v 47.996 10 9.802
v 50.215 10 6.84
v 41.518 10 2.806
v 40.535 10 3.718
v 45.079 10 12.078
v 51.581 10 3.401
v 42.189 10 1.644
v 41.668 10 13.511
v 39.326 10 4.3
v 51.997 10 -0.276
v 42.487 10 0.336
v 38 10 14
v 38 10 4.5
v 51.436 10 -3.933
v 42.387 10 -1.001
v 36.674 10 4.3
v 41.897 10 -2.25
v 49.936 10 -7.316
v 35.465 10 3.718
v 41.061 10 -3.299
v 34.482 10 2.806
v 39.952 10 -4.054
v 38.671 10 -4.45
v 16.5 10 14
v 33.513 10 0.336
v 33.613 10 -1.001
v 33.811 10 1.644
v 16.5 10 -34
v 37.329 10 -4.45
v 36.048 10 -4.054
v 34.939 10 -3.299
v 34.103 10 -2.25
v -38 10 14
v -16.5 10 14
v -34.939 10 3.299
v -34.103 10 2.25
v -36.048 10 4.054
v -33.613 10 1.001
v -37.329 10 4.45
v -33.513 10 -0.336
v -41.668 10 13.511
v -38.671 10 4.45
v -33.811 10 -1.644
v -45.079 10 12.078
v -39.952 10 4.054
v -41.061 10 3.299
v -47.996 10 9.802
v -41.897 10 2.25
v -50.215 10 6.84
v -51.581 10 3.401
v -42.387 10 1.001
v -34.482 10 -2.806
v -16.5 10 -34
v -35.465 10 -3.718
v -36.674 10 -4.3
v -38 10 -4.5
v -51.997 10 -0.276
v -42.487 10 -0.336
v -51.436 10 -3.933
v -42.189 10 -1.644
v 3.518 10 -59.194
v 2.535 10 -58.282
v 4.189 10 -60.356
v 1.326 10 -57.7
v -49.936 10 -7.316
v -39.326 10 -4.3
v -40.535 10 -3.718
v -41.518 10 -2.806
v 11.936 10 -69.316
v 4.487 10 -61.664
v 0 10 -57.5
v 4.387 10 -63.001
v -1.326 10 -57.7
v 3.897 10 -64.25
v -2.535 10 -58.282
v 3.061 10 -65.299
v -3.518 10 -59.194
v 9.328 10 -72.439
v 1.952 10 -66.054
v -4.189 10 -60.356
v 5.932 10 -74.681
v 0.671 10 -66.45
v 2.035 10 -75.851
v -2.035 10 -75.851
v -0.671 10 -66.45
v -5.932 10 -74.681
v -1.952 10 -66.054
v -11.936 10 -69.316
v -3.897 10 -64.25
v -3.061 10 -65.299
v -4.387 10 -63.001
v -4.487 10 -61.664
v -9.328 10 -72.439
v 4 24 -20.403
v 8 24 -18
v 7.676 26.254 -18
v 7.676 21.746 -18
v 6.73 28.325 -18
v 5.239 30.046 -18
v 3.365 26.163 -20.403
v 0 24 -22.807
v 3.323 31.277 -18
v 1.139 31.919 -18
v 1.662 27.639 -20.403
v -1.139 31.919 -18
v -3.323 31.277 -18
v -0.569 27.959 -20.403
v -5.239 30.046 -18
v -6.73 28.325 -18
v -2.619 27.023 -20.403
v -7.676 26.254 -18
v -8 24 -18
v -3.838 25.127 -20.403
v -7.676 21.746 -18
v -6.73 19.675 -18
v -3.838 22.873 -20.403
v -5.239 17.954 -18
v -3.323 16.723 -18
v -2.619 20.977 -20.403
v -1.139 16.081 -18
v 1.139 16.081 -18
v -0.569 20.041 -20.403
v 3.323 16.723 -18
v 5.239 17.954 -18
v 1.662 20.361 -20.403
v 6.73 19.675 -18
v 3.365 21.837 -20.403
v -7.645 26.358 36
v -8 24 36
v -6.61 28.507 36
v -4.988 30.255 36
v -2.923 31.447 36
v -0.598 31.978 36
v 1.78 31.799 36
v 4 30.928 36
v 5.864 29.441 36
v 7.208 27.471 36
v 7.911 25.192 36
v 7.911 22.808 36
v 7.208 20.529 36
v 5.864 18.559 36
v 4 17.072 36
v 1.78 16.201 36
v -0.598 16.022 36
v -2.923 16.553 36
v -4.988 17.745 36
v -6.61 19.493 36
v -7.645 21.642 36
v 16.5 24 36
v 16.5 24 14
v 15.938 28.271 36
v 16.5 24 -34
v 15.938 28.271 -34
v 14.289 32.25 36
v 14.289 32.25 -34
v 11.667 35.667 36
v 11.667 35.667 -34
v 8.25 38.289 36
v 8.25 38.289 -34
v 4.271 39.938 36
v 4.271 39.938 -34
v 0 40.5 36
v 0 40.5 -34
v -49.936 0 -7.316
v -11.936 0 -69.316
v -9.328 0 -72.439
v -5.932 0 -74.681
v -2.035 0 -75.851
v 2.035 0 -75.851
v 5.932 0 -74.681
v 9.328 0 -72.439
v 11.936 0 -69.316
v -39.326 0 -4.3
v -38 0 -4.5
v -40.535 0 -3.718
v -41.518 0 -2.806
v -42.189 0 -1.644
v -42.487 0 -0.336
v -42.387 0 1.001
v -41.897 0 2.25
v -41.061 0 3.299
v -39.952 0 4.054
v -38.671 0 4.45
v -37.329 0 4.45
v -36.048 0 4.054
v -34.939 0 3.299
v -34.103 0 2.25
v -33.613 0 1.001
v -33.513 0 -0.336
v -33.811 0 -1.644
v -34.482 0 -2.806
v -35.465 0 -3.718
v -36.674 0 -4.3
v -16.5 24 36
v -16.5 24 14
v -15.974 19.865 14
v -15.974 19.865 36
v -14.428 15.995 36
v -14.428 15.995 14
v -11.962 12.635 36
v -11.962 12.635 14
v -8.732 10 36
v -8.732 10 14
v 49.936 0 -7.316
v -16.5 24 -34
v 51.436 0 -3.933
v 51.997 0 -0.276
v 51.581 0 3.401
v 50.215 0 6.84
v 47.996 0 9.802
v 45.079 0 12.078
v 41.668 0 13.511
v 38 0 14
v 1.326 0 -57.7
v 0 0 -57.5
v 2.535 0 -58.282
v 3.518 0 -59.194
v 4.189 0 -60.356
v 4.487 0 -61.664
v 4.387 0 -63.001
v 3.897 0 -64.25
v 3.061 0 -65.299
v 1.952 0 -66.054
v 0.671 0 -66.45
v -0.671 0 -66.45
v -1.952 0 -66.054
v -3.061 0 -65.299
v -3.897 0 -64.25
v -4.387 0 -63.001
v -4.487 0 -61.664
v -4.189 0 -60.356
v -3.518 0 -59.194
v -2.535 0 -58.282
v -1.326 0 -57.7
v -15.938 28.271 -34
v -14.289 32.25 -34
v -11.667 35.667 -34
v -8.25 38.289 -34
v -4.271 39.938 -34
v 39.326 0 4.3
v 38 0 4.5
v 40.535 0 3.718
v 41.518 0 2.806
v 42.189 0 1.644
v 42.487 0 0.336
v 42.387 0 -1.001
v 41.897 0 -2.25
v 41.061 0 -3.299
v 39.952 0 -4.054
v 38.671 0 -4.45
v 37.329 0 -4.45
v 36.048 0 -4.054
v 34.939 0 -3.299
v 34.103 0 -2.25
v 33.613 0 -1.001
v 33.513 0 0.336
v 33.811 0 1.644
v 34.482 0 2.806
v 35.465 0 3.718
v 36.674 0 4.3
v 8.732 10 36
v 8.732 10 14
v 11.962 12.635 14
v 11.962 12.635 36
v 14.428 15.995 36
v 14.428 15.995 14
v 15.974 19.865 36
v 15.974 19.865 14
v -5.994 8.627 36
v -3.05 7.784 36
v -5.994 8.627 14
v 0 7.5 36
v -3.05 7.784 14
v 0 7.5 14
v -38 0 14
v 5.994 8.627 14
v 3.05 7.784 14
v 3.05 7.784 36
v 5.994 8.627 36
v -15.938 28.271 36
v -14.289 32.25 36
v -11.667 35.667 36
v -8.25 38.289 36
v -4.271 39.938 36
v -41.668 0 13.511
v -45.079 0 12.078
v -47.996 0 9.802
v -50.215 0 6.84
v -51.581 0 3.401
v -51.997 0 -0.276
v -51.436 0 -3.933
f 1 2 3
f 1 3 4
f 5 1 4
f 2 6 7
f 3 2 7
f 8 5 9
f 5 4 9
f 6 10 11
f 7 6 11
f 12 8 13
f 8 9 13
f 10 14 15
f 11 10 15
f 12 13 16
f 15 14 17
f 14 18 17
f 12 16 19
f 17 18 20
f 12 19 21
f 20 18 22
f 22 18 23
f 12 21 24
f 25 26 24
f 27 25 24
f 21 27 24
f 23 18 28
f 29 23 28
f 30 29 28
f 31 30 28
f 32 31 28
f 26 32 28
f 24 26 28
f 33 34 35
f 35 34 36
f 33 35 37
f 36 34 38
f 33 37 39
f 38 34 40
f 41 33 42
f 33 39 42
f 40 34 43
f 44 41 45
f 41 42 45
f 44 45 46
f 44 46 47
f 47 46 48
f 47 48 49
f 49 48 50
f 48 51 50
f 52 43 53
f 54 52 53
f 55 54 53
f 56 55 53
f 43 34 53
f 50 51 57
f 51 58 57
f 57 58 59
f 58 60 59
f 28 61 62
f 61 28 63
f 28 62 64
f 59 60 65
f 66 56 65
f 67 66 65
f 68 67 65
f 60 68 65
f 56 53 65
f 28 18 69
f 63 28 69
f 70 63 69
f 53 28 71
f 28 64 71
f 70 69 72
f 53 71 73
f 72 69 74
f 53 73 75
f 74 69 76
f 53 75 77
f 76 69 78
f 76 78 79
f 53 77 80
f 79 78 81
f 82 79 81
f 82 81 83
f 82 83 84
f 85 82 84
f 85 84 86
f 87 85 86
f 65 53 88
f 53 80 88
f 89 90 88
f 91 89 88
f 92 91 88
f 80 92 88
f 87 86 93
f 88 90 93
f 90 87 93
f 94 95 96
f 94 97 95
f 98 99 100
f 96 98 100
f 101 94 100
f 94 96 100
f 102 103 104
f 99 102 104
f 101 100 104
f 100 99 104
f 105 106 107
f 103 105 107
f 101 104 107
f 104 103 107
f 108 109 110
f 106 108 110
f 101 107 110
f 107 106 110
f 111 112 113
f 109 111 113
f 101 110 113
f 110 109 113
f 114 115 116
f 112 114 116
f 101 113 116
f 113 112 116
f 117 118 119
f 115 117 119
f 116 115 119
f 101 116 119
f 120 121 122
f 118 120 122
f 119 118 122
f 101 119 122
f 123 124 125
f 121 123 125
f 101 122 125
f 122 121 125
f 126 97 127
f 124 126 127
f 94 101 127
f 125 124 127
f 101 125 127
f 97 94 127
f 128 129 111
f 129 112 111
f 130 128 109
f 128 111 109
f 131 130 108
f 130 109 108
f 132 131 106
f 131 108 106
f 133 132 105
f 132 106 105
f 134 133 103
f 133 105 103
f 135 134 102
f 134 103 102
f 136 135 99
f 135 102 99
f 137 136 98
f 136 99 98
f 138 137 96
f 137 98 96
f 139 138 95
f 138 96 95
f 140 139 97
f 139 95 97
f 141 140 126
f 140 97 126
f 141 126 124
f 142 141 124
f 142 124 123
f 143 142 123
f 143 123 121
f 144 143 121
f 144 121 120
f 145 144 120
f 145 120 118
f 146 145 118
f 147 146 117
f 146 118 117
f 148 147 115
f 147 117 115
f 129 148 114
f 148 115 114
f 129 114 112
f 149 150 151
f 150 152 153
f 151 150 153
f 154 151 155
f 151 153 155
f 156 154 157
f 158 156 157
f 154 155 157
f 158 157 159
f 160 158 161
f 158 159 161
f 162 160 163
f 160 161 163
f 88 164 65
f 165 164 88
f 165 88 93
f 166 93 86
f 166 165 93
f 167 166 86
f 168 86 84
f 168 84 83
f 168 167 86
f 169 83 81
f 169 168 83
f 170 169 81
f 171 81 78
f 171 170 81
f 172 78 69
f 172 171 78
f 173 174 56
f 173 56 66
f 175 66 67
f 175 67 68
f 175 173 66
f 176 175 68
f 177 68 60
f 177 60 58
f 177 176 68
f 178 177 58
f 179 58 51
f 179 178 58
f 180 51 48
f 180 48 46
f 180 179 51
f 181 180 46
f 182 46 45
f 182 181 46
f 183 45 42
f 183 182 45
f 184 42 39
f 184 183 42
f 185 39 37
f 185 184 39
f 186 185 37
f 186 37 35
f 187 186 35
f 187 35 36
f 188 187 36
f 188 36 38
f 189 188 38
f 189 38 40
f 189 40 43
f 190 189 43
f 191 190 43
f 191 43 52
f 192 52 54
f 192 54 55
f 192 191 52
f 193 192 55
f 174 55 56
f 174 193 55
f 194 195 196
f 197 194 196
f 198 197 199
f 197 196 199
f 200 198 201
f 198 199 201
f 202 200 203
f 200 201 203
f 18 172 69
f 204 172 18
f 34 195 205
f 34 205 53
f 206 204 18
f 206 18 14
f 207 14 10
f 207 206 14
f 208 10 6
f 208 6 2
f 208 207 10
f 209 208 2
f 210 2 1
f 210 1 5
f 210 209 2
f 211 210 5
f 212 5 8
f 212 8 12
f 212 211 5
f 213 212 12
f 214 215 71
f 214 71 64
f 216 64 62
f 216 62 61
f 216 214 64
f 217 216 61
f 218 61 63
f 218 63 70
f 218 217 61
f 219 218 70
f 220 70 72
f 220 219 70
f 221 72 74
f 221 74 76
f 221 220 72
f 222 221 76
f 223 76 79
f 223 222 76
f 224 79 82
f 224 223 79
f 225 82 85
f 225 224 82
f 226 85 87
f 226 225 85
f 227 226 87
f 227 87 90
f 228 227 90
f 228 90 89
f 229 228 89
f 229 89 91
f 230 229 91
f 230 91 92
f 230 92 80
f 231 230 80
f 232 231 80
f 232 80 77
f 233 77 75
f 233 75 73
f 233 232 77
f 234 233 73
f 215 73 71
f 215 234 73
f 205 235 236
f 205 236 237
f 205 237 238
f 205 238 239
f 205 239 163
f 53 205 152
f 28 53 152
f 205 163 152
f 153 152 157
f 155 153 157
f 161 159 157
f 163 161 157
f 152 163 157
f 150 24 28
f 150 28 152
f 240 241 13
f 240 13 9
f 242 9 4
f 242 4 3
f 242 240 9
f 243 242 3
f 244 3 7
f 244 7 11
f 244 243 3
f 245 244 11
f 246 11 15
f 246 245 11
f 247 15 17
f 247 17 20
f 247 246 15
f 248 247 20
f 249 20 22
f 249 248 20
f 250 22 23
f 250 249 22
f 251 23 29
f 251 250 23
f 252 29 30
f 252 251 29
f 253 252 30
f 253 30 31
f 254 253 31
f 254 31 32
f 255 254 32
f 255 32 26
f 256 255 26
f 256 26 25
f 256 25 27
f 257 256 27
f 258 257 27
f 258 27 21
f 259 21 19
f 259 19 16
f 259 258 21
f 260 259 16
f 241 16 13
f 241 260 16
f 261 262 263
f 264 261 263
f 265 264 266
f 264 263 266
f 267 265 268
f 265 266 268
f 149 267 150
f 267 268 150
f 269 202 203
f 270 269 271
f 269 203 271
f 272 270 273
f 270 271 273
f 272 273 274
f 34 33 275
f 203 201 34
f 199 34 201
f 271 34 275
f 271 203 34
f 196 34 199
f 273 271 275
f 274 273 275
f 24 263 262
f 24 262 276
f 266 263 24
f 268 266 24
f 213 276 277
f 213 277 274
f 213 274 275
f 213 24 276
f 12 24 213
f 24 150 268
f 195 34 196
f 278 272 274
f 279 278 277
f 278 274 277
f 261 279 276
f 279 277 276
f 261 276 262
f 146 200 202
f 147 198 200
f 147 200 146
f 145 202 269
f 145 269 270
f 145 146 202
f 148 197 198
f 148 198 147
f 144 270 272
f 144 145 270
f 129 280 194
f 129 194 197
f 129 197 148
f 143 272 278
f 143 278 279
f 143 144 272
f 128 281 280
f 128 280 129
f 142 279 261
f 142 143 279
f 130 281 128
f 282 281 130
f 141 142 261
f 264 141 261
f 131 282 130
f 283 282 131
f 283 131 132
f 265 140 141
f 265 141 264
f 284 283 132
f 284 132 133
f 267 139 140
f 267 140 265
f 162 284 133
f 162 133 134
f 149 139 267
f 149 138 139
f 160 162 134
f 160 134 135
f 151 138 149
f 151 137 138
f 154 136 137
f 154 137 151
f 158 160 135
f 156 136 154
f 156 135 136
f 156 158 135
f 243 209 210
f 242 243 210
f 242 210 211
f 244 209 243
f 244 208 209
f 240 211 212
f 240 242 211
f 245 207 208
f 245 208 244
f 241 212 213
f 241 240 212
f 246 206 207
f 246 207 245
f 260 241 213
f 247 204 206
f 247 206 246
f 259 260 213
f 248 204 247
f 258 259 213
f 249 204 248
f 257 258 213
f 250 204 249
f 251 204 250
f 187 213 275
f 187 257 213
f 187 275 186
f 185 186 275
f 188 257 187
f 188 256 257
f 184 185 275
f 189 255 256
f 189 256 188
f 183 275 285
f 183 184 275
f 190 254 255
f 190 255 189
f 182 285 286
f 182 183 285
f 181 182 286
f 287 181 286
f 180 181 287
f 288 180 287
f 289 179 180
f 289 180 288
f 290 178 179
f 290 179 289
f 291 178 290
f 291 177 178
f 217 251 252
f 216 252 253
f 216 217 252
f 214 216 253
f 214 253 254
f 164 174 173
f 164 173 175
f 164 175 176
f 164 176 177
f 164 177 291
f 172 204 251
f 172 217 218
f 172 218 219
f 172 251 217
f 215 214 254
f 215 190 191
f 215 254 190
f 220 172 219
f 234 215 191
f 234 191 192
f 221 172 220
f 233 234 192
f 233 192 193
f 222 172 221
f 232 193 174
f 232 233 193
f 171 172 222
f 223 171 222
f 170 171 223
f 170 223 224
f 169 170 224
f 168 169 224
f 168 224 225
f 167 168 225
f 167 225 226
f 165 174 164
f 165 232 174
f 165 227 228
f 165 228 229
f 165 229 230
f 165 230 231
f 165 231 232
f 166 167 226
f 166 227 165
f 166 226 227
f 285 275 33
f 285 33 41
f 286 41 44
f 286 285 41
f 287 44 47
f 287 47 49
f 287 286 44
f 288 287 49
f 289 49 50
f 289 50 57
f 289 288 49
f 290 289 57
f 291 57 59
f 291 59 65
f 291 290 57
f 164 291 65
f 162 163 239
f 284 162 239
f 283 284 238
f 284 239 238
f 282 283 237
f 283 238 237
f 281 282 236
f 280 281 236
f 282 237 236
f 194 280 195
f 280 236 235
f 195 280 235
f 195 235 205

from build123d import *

# Parameters (mm, degrees)
SKETCH2_R                  = 4.5
BOSS_EXTRUDE1_DEPTH        = 10
BOSS_EXTRUDE5_DEPTH        = 22
BOSS_EXTRUDE5_DEPTH_BACK   = 48
SKETCH3_R                  = 16.5
BOSS_EXTRUDE6_DEPTH        = 48
F_16_0MM_DOWEL_HOLE1_D     = 16
F_16_0MM_DOWEL_HOLE1_DEPTH = 54
F_16_0MM_DOWEL_HOLE1_TIP   = 4.806884952


with BuildPart() as part:
    # Sketch2 → Boss-Extrude1 (new body)
    with BuildSketch(Plane(origin=(0, 0, 0), x_dir=(1, 0, 0), z_dir=(0, 1, 0))):
        with BuildLine():
            Line((11.936417534, 69.315868811), (49.936417534, 7.315868811))
            ThreePointArc((49.936417534, 7.315868811), (50.215198798, -6.840242563), (38, -14))
            Line((38, -14), (-38, -14))
            ThreePointArc((-38, -14), (-50.215198798, -6.840242563), (-49.936417534, 7.315868811))
            Line((-49.936417534, 7.315868811), (-11.936417534, 69.315868811))
            ThreePointArc((-11.936417534, 69.315868811), (0, 76), (11.936417534, 69.315868811))
        make_face()
        with Locations((0, 62)):
            Circle(SKETCH2_R, mode=Mode.SUBTRACT)
        with Locations((38, 0)):
            Circle(SKETCH2_R, mode=Mode.SUBTRACT)
        with Locations((-38, 0)):
            Circle(SKETCH2_R, mode=Mode.SUBTRACT)
    extrude(amount=BOSS_EXTRUDE1_DEPTH)

    # Sketch3 → Boss-Extrude5 (add, two sides: drawn at the far end of the back side and taken through both)
    with BuildSketch(Plane.XY.offset(14).offset(-BOSS_EXTRUDE5_DEPTH_BACK)):
        with Locations((0, 24)):
            Circle(SKETCH3_R)
    extrude(amount=BOSS_EXTRUDE5_DEPTH + BOSS_EXTRUDE5_DEPTH_BACK)

    # Sketch3<7> → Boss-Extrude6 (add)
    with BuildSketch(Plane.XY.offset(14)):
        with BuildLine():
            ThreePointArc((-8.732124598, 10), (-14.427925282, 15.994691008), (-16.5, 24))
            Line((-16.5, 24), (-16.5, 10))
            Line((-16.5, 10), (-8.732124598, 10))
        make_face()
        with BuildLine():
            Line((16.5, 10), (16.5, 24))
            ThreePointArc((16.5, 24), (14.427925282, 15.994691008), (8.732124598, 10))
            Line((8.732124598, 10), (16.5, 10))
        make_face()
    extrude(amount=-BOSS_EXTRUDE6_DEPTH)

    # Ø16.0mm Dowel Hole1
    with Locations(Plane.XY.offset(36)):
        with Locations((0, 24)):
            Hole(F_16_0MM_DOWEL_HOLE1_D / 2, depth=F_16_0MM_DOWEL_HOLE1_DEPTH)
            with Locations((0, 0, -(F_16_0MM_DOWEL_HOLE1_DEPTH + F_16_0MM_DOWEL_HOLE1_TIP / 2))):  # 118° drill point
                Cone(0, F_16_0MM_DOWEL_HOLE1_D / 2, F_16_0MM_DOWEL_HOLE1_TIP, mode=Mode.SUBTRACT)


solid = part.part
